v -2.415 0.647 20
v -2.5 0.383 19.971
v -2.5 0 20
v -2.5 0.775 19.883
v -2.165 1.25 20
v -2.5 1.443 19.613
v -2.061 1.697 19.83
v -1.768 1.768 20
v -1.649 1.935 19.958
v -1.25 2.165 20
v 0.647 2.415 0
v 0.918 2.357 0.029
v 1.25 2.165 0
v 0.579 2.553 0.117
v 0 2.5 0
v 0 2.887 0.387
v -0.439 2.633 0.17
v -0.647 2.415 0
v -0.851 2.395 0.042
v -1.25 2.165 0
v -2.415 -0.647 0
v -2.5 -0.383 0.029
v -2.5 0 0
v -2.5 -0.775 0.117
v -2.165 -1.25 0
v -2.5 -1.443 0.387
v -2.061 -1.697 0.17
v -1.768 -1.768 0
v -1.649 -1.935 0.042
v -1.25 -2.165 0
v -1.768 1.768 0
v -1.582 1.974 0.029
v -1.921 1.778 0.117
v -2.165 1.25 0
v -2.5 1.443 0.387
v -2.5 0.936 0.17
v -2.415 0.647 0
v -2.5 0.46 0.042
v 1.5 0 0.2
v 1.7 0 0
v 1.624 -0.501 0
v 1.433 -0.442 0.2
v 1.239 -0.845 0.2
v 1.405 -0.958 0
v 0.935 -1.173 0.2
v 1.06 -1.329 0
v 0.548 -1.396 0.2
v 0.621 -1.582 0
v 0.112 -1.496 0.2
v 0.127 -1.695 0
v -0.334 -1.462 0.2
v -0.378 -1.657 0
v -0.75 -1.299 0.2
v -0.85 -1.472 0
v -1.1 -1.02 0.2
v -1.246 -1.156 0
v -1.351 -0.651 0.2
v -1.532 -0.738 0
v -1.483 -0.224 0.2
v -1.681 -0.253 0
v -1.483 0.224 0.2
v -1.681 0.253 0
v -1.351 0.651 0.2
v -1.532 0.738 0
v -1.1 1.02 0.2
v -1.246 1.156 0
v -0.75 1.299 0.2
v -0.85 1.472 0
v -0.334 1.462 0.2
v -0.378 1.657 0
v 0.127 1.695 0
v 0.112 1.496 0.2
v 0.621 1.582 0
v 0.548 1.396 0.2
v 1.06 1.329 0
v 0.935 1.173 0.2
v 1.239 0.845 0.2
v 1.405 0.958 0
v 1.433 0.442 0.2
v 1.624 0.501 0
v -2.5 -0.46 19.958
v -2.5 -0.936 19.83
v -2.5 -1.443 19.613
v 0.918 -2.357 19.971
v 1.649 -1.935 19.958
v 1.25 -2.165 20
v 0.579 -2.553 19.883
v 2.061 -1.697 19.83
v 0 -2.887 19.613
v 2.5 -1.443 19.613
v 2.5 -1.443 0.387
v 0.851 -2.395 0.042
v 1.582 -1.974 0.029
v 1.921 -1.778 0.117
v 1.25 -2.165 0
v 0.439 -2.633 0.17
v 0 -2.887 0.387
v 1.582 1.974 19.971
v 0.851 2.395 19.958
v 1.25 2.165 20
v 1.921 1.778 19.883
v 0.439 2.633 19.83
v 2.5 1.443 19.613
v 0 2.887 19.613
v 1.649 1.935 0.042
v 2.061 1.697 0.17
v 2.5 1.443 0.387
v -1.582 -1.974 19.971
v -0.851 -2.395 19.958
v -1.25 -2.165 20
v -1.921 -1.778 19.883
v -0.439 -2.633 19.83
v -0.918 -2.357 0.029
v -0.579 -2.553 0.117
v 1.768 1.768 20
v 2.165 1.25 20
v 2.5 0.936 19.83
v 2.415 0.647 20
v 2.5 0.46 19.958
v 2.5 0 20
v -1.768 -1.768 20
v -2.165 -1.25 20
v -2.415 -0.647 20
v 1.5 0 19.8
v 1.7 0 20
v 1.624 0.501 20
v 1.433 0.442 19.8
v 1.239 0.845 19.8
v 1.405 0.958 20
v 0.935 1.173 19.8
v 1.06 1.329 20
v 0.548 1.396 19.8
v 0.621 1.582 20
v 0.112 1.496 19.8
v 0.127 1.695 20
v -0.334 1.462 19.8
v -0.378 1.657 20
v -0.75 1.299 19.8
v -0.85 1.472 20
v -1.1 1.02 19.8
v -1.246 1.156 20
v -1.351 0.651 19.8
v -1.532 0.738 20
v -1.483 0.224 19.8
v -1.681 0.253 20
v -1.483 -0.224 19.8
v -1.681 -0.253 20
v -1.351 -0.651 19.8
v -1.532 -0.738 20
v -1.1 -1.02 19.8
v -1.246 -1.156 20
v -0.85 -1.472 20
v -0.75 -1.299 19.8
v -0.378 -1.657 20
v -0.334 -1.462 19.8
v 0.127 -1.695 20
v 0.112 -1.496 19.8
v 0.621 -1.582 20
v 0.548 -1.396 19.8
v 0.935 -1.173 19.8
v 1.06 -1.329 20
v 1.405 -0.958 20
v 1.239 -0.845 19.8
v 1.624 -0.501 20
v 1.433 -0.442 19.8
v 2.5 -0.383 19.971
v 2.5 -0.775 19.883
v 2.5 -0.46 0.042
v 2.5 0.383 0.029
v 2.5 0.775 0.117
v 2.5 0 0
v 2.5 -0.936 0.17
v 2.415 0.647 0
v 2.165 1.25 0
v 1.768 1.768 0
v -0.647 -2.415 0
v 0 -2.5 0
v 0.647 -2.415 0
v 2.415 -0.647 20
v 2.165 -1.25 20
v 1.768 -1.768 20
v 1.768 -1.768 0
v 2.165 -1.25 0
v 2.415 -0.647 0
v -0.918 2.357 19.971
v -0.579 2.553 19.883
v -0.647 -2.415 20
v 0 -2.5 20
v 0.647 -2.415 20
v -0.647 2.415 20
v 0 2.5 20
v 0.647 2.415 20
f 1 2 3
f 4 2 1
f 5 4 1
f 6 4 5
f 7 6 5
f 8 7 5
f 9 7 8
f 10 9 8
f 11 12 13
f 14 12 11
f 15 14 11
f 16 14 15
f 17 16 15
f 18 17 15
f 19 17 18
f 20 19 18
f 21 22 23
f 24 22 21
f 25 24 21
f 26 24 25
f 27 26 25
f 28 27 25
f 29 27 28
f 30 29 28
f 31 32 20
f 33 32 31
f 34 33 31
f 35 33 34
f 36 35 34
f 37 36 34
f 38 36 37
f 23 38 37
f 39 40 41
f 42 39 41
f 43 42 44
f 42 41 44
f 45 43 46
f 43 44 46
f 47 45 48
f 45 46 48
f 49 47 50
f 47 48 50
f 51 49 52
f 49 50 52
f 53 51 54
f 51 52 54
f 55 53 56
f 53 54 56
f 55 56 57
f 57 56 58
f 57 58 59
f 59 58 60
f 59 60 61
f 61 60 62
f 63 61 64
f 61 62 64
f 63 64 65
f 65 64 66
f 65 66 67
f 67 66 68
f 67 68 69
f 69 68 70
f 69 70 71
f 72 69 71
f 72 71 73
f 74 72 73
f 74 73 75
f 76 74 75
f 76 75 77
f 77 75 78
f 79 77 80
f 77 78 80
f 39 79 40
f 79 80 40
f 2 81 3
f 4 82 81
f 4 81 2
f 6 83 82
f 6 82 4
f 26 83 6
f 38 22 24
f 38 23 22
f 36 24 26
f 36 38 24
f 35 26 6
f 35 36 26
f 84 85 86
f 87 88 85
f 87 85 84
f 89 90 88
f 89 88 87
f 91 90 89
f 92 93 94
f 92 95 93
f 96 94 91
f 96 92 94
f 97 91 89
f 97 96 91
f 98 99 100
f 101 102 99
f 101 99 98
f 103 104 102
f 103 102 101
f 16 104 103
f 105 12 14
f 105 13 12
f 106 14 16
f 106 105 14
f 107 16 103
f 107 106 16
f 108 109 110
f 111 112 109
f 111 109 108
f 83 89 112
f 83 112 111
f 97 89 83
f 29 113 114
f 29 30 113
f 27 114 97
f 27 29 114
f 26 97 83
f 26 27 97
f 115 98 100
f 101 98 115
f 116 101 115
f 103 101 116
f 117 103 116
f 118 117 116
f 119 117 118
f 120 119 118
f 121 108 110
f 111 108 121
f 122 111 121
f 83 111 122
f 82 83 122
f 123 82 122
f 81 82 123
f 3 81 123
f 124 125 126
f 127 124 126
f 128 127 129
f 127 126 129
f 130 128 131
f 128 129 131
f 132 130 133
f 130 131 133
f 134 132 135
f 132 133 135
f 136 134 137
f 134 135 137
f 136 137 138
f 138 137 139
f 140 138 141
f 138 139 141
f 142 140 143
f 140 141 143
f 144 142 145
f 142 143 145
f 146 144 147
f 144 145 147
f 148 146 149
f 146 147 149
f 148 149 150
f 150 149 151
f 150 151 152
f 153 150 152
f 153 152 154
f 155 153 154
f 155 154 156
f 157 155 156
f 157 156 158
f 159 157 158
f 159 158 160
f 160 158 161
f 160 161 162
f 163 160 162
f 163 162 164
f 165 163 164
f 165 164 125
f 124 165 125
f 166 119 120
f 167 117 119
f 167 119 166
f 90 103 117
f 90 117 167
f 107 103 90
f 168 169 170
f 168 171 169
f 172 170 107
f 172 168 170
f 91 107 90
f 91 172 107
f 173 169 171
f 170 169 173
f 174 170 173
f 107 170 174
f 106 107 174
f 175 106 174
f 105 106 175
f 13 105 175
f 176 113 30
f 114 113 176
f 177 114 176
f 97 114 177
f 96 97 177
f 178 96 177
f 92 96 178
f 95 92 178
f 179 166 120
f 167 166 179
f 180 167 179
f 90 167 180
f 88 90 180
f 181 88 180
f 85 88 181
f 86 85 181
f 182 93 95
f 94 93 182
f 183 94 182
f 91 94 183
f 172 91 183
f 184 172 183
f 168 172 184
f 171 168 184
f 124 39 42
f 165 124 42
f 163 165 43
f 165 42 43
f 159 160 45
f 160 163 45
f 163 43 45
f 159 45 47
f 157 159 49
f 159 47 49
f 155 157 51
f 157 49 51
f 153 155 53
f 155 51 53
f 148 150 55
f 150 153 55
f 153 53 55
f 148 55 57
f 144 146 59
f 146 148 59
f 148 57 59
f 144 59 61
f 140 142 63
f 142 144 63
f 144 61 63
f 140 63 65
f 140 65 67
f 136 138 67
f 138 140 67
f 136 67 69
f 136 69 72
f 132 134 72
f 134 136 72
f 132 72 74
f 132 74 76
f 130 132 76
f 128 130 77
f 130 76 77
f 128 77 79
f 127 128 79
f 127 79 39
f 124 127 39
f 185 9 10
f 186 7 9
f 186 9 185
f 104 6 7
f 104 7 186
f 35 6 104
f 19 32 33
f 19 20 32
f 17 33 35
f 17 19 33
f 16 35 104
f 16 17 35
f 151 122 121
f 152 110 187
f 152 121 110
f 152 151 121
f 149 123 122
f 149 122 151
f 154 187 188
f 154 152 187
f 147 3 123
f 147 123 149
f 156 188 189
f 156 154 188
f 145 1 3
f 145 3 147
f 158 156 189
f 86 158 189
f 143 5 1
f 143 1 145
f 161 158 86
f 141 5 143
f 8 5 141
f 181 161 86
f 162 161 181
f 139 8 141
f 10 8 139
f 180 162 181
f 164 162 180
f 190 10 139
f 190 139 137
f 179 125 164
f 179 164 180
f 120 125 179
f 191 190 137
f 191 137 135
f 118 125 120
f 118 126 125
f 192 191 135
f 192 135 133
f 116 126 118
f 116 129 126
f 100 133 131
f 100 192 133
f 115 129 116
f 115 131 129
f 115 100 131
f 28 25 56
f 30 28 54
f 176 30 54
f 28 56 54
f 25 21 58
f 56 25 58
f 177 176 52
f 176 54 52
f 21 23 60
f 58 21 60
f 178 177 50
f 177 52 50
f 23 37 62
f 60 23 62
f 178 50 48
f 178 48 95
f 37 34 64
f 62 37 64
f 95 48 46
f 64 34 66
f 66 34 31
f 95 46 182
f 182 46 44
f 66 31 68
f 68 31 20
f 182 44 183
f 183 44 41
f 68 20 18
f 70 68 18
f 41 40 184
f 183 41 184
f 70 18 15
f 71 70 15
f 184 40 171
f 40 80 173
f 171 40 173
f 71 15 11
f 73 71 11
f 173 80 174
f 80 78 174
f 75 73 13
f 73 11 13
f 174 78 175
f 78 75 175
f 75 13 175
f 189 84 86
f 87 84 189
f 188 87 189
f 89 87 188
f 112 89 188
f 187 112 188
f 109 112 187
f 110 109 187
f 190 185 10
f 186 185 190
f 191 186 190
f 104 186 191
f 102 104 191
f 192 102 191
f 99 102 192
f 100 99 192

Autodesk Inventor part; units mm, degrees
ref_plane "YZ Plane" through (0, 0, 0) normal (1, 0, 0) x (0, 1, 0)
ref_plane "XZ Plane" through (0, 0, 0) normal (0, 1, 0) x (-1, 0, 0)
ref_plane "XY Plane" through (0, 0, 0) normal (0, 0, 1) x (1, 0, 0)
sketch "Náčrt1" plane through (0, 0, 0) normal (0, 0, 1) x (1, 0, 0)
  line L0 (2.5, -1.4434) -> (0, -2.8868)
  line L1 (0, -2.8868) -> (-2.5, -1.4434)
  line L2 (-2.5, -1.4434) -> (-2.5, 1.4434)
  line L3 (-2.5, 1.4434) -> (0, 2.8868)
  line L4 (0, 2.8868) -> (2.5, 1.4434)
  line L5 (2.5, 1.4434) -> (2.5, -1.4434)
  circle A0 centre (0, 0) radius 1.5
  point P0 (2.5, 0)
  dimension "d1" = 3
  dimension "d16" = 5
extrude "Vysunutí1" add sketch "Náčrt1" along normal blind 20
thread "Závit1" size "M3x0.5" class "6H" standard "ANSI Metric M Profile" full length
sketch "Náčrt2" plane through (0, 0, 20) normal (0, 0, 1) x (1, 0, 0)
  circle A0 centre (0, 0) radius 2.5
  dimension "d18" = 5
extrude "Vysunutí2" cut sketch "Náčrt2" against normal through all draft 45 keep common part
sketch "Náčrt3" plane through (0, 0, 0) normal (0, 0, -1) x (-1, 0, 0)
  circle A0 centre (0, 0) radius 2.5
  dimension "d17" = 5
extrude "Vysunutí3" cut sketch "Náčrt3" against normal through all draft 45 keep common part
chamfer "Zkosení1" distance 0.2 angle 45 1 edges at (-1.5, 0, 20)
chamfer "Zkosení2" distance 0.2 angle 45 1 edges at (-1.5, 0, 0)
properties part number "PillarBolt-M3x20" material "Ocel, vysokopevnostní, nízkolegovaná"
